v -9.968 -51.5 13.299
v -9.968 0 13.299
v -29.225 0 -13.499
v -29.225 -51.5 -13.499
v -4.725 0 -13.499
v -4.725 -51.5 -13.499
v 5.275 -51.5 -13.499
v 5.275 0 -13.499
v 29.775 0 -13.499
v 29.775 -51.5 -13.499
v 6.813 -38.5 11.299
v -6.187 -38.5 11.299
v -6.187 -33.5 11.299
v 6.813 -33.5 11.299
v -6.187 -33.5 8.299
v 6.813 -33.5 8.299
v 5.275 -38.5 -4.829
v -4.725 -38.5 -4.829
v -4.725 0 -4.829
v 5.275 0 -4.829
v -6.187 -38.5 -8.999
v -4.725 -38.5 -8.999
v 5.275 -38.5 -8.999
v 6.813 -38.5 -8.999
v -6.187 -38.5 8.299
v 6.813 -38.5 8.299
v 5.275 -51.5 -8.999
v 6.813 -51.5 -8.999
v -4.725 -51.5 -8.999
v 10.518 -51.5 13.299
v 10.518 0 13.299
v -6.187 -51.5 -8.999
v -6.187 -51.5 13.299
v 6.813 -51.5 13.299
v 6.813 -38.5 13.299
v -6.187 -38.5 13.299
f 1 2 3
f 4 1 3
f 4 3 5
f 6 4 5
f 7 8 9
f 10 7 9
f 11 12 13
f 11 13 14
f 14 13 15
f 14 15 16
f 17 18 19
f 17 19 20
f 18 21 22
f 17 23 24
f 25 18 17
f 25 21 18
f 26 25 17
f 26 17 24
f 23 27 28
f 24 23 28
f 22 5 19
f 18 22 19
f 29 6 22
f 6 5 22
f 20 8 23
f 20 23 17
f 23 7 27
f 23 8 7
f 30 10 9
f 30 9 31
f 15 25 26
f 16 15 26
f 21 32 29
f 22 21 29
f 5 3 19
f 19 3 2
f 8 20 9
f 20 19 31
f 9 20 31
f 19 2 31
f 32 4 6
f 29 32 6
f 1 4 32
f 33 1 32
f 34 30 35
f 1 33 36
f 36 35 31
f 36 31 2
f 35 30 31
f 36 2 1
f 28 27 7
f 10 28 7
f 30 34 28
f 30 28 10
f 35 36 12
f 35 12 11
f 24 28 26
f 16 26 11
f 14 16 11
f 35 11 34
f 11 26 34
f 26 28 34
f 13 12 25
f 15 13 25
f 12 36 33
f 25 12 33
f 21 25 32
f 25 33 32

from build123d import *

# Parameters (mm, degrees)
F1_DEPTH = 51.5
F2_W     = 10
F2_H     = 8.67
F3_DEPTH = 51.501
F5_DEPTH = 13
F6_W     = 13
F6_H     = 3
F7_DEPTH = 5


with BuildPart() as f1:
    # F0 (on Front) → F1 (new body)
    with BuildSketch(Plane.XZ):
        Polygon((-9.96814, 13.299286), (-29.225, -13.49947), (29.775, -13.49947), (10.51814, 13.299286), align=None)
    extrude(amount=F1_DEPTH)

    # F2 (on face) → F3 (cut, through all)
    with BuildSketch(Plane.XZ.offset(51.5)):
        with Locations((0.275, -9.16447)):
            Rectangle(F2_W, F2_H)
    extrude(amount=-F3_DEPTH, mode=Mode.SUBTRACT)

    # F4 (on face) → F5 (cut)
    with BuildSketch(Plane.XZ.offset(51.5)):
        Polygon((-6.187351, -8.99947), (-4.725, -8.99947), (-4.725, -4.82947), (5.275, -4.82947), (5.275, -8.99947), (6.812649, -8.99947), (6.812649, 13.299286), (-6.187351, 13.299286), align=None)
    extrude(amount=-F5_DEPTH, mode=Mode.SUBTRACT)

    # F6 (on face) → F7 (cut)
    with BuildSketch(Plane.XZ.offset(38.5)):
        with Locations((0.312649, 9.799286)):
            Rectangle(F6_W, F6_H)
    extrude(amount=-F7_DEPTH, mode=Mode.SUBTRACT)


solid = f1.part
